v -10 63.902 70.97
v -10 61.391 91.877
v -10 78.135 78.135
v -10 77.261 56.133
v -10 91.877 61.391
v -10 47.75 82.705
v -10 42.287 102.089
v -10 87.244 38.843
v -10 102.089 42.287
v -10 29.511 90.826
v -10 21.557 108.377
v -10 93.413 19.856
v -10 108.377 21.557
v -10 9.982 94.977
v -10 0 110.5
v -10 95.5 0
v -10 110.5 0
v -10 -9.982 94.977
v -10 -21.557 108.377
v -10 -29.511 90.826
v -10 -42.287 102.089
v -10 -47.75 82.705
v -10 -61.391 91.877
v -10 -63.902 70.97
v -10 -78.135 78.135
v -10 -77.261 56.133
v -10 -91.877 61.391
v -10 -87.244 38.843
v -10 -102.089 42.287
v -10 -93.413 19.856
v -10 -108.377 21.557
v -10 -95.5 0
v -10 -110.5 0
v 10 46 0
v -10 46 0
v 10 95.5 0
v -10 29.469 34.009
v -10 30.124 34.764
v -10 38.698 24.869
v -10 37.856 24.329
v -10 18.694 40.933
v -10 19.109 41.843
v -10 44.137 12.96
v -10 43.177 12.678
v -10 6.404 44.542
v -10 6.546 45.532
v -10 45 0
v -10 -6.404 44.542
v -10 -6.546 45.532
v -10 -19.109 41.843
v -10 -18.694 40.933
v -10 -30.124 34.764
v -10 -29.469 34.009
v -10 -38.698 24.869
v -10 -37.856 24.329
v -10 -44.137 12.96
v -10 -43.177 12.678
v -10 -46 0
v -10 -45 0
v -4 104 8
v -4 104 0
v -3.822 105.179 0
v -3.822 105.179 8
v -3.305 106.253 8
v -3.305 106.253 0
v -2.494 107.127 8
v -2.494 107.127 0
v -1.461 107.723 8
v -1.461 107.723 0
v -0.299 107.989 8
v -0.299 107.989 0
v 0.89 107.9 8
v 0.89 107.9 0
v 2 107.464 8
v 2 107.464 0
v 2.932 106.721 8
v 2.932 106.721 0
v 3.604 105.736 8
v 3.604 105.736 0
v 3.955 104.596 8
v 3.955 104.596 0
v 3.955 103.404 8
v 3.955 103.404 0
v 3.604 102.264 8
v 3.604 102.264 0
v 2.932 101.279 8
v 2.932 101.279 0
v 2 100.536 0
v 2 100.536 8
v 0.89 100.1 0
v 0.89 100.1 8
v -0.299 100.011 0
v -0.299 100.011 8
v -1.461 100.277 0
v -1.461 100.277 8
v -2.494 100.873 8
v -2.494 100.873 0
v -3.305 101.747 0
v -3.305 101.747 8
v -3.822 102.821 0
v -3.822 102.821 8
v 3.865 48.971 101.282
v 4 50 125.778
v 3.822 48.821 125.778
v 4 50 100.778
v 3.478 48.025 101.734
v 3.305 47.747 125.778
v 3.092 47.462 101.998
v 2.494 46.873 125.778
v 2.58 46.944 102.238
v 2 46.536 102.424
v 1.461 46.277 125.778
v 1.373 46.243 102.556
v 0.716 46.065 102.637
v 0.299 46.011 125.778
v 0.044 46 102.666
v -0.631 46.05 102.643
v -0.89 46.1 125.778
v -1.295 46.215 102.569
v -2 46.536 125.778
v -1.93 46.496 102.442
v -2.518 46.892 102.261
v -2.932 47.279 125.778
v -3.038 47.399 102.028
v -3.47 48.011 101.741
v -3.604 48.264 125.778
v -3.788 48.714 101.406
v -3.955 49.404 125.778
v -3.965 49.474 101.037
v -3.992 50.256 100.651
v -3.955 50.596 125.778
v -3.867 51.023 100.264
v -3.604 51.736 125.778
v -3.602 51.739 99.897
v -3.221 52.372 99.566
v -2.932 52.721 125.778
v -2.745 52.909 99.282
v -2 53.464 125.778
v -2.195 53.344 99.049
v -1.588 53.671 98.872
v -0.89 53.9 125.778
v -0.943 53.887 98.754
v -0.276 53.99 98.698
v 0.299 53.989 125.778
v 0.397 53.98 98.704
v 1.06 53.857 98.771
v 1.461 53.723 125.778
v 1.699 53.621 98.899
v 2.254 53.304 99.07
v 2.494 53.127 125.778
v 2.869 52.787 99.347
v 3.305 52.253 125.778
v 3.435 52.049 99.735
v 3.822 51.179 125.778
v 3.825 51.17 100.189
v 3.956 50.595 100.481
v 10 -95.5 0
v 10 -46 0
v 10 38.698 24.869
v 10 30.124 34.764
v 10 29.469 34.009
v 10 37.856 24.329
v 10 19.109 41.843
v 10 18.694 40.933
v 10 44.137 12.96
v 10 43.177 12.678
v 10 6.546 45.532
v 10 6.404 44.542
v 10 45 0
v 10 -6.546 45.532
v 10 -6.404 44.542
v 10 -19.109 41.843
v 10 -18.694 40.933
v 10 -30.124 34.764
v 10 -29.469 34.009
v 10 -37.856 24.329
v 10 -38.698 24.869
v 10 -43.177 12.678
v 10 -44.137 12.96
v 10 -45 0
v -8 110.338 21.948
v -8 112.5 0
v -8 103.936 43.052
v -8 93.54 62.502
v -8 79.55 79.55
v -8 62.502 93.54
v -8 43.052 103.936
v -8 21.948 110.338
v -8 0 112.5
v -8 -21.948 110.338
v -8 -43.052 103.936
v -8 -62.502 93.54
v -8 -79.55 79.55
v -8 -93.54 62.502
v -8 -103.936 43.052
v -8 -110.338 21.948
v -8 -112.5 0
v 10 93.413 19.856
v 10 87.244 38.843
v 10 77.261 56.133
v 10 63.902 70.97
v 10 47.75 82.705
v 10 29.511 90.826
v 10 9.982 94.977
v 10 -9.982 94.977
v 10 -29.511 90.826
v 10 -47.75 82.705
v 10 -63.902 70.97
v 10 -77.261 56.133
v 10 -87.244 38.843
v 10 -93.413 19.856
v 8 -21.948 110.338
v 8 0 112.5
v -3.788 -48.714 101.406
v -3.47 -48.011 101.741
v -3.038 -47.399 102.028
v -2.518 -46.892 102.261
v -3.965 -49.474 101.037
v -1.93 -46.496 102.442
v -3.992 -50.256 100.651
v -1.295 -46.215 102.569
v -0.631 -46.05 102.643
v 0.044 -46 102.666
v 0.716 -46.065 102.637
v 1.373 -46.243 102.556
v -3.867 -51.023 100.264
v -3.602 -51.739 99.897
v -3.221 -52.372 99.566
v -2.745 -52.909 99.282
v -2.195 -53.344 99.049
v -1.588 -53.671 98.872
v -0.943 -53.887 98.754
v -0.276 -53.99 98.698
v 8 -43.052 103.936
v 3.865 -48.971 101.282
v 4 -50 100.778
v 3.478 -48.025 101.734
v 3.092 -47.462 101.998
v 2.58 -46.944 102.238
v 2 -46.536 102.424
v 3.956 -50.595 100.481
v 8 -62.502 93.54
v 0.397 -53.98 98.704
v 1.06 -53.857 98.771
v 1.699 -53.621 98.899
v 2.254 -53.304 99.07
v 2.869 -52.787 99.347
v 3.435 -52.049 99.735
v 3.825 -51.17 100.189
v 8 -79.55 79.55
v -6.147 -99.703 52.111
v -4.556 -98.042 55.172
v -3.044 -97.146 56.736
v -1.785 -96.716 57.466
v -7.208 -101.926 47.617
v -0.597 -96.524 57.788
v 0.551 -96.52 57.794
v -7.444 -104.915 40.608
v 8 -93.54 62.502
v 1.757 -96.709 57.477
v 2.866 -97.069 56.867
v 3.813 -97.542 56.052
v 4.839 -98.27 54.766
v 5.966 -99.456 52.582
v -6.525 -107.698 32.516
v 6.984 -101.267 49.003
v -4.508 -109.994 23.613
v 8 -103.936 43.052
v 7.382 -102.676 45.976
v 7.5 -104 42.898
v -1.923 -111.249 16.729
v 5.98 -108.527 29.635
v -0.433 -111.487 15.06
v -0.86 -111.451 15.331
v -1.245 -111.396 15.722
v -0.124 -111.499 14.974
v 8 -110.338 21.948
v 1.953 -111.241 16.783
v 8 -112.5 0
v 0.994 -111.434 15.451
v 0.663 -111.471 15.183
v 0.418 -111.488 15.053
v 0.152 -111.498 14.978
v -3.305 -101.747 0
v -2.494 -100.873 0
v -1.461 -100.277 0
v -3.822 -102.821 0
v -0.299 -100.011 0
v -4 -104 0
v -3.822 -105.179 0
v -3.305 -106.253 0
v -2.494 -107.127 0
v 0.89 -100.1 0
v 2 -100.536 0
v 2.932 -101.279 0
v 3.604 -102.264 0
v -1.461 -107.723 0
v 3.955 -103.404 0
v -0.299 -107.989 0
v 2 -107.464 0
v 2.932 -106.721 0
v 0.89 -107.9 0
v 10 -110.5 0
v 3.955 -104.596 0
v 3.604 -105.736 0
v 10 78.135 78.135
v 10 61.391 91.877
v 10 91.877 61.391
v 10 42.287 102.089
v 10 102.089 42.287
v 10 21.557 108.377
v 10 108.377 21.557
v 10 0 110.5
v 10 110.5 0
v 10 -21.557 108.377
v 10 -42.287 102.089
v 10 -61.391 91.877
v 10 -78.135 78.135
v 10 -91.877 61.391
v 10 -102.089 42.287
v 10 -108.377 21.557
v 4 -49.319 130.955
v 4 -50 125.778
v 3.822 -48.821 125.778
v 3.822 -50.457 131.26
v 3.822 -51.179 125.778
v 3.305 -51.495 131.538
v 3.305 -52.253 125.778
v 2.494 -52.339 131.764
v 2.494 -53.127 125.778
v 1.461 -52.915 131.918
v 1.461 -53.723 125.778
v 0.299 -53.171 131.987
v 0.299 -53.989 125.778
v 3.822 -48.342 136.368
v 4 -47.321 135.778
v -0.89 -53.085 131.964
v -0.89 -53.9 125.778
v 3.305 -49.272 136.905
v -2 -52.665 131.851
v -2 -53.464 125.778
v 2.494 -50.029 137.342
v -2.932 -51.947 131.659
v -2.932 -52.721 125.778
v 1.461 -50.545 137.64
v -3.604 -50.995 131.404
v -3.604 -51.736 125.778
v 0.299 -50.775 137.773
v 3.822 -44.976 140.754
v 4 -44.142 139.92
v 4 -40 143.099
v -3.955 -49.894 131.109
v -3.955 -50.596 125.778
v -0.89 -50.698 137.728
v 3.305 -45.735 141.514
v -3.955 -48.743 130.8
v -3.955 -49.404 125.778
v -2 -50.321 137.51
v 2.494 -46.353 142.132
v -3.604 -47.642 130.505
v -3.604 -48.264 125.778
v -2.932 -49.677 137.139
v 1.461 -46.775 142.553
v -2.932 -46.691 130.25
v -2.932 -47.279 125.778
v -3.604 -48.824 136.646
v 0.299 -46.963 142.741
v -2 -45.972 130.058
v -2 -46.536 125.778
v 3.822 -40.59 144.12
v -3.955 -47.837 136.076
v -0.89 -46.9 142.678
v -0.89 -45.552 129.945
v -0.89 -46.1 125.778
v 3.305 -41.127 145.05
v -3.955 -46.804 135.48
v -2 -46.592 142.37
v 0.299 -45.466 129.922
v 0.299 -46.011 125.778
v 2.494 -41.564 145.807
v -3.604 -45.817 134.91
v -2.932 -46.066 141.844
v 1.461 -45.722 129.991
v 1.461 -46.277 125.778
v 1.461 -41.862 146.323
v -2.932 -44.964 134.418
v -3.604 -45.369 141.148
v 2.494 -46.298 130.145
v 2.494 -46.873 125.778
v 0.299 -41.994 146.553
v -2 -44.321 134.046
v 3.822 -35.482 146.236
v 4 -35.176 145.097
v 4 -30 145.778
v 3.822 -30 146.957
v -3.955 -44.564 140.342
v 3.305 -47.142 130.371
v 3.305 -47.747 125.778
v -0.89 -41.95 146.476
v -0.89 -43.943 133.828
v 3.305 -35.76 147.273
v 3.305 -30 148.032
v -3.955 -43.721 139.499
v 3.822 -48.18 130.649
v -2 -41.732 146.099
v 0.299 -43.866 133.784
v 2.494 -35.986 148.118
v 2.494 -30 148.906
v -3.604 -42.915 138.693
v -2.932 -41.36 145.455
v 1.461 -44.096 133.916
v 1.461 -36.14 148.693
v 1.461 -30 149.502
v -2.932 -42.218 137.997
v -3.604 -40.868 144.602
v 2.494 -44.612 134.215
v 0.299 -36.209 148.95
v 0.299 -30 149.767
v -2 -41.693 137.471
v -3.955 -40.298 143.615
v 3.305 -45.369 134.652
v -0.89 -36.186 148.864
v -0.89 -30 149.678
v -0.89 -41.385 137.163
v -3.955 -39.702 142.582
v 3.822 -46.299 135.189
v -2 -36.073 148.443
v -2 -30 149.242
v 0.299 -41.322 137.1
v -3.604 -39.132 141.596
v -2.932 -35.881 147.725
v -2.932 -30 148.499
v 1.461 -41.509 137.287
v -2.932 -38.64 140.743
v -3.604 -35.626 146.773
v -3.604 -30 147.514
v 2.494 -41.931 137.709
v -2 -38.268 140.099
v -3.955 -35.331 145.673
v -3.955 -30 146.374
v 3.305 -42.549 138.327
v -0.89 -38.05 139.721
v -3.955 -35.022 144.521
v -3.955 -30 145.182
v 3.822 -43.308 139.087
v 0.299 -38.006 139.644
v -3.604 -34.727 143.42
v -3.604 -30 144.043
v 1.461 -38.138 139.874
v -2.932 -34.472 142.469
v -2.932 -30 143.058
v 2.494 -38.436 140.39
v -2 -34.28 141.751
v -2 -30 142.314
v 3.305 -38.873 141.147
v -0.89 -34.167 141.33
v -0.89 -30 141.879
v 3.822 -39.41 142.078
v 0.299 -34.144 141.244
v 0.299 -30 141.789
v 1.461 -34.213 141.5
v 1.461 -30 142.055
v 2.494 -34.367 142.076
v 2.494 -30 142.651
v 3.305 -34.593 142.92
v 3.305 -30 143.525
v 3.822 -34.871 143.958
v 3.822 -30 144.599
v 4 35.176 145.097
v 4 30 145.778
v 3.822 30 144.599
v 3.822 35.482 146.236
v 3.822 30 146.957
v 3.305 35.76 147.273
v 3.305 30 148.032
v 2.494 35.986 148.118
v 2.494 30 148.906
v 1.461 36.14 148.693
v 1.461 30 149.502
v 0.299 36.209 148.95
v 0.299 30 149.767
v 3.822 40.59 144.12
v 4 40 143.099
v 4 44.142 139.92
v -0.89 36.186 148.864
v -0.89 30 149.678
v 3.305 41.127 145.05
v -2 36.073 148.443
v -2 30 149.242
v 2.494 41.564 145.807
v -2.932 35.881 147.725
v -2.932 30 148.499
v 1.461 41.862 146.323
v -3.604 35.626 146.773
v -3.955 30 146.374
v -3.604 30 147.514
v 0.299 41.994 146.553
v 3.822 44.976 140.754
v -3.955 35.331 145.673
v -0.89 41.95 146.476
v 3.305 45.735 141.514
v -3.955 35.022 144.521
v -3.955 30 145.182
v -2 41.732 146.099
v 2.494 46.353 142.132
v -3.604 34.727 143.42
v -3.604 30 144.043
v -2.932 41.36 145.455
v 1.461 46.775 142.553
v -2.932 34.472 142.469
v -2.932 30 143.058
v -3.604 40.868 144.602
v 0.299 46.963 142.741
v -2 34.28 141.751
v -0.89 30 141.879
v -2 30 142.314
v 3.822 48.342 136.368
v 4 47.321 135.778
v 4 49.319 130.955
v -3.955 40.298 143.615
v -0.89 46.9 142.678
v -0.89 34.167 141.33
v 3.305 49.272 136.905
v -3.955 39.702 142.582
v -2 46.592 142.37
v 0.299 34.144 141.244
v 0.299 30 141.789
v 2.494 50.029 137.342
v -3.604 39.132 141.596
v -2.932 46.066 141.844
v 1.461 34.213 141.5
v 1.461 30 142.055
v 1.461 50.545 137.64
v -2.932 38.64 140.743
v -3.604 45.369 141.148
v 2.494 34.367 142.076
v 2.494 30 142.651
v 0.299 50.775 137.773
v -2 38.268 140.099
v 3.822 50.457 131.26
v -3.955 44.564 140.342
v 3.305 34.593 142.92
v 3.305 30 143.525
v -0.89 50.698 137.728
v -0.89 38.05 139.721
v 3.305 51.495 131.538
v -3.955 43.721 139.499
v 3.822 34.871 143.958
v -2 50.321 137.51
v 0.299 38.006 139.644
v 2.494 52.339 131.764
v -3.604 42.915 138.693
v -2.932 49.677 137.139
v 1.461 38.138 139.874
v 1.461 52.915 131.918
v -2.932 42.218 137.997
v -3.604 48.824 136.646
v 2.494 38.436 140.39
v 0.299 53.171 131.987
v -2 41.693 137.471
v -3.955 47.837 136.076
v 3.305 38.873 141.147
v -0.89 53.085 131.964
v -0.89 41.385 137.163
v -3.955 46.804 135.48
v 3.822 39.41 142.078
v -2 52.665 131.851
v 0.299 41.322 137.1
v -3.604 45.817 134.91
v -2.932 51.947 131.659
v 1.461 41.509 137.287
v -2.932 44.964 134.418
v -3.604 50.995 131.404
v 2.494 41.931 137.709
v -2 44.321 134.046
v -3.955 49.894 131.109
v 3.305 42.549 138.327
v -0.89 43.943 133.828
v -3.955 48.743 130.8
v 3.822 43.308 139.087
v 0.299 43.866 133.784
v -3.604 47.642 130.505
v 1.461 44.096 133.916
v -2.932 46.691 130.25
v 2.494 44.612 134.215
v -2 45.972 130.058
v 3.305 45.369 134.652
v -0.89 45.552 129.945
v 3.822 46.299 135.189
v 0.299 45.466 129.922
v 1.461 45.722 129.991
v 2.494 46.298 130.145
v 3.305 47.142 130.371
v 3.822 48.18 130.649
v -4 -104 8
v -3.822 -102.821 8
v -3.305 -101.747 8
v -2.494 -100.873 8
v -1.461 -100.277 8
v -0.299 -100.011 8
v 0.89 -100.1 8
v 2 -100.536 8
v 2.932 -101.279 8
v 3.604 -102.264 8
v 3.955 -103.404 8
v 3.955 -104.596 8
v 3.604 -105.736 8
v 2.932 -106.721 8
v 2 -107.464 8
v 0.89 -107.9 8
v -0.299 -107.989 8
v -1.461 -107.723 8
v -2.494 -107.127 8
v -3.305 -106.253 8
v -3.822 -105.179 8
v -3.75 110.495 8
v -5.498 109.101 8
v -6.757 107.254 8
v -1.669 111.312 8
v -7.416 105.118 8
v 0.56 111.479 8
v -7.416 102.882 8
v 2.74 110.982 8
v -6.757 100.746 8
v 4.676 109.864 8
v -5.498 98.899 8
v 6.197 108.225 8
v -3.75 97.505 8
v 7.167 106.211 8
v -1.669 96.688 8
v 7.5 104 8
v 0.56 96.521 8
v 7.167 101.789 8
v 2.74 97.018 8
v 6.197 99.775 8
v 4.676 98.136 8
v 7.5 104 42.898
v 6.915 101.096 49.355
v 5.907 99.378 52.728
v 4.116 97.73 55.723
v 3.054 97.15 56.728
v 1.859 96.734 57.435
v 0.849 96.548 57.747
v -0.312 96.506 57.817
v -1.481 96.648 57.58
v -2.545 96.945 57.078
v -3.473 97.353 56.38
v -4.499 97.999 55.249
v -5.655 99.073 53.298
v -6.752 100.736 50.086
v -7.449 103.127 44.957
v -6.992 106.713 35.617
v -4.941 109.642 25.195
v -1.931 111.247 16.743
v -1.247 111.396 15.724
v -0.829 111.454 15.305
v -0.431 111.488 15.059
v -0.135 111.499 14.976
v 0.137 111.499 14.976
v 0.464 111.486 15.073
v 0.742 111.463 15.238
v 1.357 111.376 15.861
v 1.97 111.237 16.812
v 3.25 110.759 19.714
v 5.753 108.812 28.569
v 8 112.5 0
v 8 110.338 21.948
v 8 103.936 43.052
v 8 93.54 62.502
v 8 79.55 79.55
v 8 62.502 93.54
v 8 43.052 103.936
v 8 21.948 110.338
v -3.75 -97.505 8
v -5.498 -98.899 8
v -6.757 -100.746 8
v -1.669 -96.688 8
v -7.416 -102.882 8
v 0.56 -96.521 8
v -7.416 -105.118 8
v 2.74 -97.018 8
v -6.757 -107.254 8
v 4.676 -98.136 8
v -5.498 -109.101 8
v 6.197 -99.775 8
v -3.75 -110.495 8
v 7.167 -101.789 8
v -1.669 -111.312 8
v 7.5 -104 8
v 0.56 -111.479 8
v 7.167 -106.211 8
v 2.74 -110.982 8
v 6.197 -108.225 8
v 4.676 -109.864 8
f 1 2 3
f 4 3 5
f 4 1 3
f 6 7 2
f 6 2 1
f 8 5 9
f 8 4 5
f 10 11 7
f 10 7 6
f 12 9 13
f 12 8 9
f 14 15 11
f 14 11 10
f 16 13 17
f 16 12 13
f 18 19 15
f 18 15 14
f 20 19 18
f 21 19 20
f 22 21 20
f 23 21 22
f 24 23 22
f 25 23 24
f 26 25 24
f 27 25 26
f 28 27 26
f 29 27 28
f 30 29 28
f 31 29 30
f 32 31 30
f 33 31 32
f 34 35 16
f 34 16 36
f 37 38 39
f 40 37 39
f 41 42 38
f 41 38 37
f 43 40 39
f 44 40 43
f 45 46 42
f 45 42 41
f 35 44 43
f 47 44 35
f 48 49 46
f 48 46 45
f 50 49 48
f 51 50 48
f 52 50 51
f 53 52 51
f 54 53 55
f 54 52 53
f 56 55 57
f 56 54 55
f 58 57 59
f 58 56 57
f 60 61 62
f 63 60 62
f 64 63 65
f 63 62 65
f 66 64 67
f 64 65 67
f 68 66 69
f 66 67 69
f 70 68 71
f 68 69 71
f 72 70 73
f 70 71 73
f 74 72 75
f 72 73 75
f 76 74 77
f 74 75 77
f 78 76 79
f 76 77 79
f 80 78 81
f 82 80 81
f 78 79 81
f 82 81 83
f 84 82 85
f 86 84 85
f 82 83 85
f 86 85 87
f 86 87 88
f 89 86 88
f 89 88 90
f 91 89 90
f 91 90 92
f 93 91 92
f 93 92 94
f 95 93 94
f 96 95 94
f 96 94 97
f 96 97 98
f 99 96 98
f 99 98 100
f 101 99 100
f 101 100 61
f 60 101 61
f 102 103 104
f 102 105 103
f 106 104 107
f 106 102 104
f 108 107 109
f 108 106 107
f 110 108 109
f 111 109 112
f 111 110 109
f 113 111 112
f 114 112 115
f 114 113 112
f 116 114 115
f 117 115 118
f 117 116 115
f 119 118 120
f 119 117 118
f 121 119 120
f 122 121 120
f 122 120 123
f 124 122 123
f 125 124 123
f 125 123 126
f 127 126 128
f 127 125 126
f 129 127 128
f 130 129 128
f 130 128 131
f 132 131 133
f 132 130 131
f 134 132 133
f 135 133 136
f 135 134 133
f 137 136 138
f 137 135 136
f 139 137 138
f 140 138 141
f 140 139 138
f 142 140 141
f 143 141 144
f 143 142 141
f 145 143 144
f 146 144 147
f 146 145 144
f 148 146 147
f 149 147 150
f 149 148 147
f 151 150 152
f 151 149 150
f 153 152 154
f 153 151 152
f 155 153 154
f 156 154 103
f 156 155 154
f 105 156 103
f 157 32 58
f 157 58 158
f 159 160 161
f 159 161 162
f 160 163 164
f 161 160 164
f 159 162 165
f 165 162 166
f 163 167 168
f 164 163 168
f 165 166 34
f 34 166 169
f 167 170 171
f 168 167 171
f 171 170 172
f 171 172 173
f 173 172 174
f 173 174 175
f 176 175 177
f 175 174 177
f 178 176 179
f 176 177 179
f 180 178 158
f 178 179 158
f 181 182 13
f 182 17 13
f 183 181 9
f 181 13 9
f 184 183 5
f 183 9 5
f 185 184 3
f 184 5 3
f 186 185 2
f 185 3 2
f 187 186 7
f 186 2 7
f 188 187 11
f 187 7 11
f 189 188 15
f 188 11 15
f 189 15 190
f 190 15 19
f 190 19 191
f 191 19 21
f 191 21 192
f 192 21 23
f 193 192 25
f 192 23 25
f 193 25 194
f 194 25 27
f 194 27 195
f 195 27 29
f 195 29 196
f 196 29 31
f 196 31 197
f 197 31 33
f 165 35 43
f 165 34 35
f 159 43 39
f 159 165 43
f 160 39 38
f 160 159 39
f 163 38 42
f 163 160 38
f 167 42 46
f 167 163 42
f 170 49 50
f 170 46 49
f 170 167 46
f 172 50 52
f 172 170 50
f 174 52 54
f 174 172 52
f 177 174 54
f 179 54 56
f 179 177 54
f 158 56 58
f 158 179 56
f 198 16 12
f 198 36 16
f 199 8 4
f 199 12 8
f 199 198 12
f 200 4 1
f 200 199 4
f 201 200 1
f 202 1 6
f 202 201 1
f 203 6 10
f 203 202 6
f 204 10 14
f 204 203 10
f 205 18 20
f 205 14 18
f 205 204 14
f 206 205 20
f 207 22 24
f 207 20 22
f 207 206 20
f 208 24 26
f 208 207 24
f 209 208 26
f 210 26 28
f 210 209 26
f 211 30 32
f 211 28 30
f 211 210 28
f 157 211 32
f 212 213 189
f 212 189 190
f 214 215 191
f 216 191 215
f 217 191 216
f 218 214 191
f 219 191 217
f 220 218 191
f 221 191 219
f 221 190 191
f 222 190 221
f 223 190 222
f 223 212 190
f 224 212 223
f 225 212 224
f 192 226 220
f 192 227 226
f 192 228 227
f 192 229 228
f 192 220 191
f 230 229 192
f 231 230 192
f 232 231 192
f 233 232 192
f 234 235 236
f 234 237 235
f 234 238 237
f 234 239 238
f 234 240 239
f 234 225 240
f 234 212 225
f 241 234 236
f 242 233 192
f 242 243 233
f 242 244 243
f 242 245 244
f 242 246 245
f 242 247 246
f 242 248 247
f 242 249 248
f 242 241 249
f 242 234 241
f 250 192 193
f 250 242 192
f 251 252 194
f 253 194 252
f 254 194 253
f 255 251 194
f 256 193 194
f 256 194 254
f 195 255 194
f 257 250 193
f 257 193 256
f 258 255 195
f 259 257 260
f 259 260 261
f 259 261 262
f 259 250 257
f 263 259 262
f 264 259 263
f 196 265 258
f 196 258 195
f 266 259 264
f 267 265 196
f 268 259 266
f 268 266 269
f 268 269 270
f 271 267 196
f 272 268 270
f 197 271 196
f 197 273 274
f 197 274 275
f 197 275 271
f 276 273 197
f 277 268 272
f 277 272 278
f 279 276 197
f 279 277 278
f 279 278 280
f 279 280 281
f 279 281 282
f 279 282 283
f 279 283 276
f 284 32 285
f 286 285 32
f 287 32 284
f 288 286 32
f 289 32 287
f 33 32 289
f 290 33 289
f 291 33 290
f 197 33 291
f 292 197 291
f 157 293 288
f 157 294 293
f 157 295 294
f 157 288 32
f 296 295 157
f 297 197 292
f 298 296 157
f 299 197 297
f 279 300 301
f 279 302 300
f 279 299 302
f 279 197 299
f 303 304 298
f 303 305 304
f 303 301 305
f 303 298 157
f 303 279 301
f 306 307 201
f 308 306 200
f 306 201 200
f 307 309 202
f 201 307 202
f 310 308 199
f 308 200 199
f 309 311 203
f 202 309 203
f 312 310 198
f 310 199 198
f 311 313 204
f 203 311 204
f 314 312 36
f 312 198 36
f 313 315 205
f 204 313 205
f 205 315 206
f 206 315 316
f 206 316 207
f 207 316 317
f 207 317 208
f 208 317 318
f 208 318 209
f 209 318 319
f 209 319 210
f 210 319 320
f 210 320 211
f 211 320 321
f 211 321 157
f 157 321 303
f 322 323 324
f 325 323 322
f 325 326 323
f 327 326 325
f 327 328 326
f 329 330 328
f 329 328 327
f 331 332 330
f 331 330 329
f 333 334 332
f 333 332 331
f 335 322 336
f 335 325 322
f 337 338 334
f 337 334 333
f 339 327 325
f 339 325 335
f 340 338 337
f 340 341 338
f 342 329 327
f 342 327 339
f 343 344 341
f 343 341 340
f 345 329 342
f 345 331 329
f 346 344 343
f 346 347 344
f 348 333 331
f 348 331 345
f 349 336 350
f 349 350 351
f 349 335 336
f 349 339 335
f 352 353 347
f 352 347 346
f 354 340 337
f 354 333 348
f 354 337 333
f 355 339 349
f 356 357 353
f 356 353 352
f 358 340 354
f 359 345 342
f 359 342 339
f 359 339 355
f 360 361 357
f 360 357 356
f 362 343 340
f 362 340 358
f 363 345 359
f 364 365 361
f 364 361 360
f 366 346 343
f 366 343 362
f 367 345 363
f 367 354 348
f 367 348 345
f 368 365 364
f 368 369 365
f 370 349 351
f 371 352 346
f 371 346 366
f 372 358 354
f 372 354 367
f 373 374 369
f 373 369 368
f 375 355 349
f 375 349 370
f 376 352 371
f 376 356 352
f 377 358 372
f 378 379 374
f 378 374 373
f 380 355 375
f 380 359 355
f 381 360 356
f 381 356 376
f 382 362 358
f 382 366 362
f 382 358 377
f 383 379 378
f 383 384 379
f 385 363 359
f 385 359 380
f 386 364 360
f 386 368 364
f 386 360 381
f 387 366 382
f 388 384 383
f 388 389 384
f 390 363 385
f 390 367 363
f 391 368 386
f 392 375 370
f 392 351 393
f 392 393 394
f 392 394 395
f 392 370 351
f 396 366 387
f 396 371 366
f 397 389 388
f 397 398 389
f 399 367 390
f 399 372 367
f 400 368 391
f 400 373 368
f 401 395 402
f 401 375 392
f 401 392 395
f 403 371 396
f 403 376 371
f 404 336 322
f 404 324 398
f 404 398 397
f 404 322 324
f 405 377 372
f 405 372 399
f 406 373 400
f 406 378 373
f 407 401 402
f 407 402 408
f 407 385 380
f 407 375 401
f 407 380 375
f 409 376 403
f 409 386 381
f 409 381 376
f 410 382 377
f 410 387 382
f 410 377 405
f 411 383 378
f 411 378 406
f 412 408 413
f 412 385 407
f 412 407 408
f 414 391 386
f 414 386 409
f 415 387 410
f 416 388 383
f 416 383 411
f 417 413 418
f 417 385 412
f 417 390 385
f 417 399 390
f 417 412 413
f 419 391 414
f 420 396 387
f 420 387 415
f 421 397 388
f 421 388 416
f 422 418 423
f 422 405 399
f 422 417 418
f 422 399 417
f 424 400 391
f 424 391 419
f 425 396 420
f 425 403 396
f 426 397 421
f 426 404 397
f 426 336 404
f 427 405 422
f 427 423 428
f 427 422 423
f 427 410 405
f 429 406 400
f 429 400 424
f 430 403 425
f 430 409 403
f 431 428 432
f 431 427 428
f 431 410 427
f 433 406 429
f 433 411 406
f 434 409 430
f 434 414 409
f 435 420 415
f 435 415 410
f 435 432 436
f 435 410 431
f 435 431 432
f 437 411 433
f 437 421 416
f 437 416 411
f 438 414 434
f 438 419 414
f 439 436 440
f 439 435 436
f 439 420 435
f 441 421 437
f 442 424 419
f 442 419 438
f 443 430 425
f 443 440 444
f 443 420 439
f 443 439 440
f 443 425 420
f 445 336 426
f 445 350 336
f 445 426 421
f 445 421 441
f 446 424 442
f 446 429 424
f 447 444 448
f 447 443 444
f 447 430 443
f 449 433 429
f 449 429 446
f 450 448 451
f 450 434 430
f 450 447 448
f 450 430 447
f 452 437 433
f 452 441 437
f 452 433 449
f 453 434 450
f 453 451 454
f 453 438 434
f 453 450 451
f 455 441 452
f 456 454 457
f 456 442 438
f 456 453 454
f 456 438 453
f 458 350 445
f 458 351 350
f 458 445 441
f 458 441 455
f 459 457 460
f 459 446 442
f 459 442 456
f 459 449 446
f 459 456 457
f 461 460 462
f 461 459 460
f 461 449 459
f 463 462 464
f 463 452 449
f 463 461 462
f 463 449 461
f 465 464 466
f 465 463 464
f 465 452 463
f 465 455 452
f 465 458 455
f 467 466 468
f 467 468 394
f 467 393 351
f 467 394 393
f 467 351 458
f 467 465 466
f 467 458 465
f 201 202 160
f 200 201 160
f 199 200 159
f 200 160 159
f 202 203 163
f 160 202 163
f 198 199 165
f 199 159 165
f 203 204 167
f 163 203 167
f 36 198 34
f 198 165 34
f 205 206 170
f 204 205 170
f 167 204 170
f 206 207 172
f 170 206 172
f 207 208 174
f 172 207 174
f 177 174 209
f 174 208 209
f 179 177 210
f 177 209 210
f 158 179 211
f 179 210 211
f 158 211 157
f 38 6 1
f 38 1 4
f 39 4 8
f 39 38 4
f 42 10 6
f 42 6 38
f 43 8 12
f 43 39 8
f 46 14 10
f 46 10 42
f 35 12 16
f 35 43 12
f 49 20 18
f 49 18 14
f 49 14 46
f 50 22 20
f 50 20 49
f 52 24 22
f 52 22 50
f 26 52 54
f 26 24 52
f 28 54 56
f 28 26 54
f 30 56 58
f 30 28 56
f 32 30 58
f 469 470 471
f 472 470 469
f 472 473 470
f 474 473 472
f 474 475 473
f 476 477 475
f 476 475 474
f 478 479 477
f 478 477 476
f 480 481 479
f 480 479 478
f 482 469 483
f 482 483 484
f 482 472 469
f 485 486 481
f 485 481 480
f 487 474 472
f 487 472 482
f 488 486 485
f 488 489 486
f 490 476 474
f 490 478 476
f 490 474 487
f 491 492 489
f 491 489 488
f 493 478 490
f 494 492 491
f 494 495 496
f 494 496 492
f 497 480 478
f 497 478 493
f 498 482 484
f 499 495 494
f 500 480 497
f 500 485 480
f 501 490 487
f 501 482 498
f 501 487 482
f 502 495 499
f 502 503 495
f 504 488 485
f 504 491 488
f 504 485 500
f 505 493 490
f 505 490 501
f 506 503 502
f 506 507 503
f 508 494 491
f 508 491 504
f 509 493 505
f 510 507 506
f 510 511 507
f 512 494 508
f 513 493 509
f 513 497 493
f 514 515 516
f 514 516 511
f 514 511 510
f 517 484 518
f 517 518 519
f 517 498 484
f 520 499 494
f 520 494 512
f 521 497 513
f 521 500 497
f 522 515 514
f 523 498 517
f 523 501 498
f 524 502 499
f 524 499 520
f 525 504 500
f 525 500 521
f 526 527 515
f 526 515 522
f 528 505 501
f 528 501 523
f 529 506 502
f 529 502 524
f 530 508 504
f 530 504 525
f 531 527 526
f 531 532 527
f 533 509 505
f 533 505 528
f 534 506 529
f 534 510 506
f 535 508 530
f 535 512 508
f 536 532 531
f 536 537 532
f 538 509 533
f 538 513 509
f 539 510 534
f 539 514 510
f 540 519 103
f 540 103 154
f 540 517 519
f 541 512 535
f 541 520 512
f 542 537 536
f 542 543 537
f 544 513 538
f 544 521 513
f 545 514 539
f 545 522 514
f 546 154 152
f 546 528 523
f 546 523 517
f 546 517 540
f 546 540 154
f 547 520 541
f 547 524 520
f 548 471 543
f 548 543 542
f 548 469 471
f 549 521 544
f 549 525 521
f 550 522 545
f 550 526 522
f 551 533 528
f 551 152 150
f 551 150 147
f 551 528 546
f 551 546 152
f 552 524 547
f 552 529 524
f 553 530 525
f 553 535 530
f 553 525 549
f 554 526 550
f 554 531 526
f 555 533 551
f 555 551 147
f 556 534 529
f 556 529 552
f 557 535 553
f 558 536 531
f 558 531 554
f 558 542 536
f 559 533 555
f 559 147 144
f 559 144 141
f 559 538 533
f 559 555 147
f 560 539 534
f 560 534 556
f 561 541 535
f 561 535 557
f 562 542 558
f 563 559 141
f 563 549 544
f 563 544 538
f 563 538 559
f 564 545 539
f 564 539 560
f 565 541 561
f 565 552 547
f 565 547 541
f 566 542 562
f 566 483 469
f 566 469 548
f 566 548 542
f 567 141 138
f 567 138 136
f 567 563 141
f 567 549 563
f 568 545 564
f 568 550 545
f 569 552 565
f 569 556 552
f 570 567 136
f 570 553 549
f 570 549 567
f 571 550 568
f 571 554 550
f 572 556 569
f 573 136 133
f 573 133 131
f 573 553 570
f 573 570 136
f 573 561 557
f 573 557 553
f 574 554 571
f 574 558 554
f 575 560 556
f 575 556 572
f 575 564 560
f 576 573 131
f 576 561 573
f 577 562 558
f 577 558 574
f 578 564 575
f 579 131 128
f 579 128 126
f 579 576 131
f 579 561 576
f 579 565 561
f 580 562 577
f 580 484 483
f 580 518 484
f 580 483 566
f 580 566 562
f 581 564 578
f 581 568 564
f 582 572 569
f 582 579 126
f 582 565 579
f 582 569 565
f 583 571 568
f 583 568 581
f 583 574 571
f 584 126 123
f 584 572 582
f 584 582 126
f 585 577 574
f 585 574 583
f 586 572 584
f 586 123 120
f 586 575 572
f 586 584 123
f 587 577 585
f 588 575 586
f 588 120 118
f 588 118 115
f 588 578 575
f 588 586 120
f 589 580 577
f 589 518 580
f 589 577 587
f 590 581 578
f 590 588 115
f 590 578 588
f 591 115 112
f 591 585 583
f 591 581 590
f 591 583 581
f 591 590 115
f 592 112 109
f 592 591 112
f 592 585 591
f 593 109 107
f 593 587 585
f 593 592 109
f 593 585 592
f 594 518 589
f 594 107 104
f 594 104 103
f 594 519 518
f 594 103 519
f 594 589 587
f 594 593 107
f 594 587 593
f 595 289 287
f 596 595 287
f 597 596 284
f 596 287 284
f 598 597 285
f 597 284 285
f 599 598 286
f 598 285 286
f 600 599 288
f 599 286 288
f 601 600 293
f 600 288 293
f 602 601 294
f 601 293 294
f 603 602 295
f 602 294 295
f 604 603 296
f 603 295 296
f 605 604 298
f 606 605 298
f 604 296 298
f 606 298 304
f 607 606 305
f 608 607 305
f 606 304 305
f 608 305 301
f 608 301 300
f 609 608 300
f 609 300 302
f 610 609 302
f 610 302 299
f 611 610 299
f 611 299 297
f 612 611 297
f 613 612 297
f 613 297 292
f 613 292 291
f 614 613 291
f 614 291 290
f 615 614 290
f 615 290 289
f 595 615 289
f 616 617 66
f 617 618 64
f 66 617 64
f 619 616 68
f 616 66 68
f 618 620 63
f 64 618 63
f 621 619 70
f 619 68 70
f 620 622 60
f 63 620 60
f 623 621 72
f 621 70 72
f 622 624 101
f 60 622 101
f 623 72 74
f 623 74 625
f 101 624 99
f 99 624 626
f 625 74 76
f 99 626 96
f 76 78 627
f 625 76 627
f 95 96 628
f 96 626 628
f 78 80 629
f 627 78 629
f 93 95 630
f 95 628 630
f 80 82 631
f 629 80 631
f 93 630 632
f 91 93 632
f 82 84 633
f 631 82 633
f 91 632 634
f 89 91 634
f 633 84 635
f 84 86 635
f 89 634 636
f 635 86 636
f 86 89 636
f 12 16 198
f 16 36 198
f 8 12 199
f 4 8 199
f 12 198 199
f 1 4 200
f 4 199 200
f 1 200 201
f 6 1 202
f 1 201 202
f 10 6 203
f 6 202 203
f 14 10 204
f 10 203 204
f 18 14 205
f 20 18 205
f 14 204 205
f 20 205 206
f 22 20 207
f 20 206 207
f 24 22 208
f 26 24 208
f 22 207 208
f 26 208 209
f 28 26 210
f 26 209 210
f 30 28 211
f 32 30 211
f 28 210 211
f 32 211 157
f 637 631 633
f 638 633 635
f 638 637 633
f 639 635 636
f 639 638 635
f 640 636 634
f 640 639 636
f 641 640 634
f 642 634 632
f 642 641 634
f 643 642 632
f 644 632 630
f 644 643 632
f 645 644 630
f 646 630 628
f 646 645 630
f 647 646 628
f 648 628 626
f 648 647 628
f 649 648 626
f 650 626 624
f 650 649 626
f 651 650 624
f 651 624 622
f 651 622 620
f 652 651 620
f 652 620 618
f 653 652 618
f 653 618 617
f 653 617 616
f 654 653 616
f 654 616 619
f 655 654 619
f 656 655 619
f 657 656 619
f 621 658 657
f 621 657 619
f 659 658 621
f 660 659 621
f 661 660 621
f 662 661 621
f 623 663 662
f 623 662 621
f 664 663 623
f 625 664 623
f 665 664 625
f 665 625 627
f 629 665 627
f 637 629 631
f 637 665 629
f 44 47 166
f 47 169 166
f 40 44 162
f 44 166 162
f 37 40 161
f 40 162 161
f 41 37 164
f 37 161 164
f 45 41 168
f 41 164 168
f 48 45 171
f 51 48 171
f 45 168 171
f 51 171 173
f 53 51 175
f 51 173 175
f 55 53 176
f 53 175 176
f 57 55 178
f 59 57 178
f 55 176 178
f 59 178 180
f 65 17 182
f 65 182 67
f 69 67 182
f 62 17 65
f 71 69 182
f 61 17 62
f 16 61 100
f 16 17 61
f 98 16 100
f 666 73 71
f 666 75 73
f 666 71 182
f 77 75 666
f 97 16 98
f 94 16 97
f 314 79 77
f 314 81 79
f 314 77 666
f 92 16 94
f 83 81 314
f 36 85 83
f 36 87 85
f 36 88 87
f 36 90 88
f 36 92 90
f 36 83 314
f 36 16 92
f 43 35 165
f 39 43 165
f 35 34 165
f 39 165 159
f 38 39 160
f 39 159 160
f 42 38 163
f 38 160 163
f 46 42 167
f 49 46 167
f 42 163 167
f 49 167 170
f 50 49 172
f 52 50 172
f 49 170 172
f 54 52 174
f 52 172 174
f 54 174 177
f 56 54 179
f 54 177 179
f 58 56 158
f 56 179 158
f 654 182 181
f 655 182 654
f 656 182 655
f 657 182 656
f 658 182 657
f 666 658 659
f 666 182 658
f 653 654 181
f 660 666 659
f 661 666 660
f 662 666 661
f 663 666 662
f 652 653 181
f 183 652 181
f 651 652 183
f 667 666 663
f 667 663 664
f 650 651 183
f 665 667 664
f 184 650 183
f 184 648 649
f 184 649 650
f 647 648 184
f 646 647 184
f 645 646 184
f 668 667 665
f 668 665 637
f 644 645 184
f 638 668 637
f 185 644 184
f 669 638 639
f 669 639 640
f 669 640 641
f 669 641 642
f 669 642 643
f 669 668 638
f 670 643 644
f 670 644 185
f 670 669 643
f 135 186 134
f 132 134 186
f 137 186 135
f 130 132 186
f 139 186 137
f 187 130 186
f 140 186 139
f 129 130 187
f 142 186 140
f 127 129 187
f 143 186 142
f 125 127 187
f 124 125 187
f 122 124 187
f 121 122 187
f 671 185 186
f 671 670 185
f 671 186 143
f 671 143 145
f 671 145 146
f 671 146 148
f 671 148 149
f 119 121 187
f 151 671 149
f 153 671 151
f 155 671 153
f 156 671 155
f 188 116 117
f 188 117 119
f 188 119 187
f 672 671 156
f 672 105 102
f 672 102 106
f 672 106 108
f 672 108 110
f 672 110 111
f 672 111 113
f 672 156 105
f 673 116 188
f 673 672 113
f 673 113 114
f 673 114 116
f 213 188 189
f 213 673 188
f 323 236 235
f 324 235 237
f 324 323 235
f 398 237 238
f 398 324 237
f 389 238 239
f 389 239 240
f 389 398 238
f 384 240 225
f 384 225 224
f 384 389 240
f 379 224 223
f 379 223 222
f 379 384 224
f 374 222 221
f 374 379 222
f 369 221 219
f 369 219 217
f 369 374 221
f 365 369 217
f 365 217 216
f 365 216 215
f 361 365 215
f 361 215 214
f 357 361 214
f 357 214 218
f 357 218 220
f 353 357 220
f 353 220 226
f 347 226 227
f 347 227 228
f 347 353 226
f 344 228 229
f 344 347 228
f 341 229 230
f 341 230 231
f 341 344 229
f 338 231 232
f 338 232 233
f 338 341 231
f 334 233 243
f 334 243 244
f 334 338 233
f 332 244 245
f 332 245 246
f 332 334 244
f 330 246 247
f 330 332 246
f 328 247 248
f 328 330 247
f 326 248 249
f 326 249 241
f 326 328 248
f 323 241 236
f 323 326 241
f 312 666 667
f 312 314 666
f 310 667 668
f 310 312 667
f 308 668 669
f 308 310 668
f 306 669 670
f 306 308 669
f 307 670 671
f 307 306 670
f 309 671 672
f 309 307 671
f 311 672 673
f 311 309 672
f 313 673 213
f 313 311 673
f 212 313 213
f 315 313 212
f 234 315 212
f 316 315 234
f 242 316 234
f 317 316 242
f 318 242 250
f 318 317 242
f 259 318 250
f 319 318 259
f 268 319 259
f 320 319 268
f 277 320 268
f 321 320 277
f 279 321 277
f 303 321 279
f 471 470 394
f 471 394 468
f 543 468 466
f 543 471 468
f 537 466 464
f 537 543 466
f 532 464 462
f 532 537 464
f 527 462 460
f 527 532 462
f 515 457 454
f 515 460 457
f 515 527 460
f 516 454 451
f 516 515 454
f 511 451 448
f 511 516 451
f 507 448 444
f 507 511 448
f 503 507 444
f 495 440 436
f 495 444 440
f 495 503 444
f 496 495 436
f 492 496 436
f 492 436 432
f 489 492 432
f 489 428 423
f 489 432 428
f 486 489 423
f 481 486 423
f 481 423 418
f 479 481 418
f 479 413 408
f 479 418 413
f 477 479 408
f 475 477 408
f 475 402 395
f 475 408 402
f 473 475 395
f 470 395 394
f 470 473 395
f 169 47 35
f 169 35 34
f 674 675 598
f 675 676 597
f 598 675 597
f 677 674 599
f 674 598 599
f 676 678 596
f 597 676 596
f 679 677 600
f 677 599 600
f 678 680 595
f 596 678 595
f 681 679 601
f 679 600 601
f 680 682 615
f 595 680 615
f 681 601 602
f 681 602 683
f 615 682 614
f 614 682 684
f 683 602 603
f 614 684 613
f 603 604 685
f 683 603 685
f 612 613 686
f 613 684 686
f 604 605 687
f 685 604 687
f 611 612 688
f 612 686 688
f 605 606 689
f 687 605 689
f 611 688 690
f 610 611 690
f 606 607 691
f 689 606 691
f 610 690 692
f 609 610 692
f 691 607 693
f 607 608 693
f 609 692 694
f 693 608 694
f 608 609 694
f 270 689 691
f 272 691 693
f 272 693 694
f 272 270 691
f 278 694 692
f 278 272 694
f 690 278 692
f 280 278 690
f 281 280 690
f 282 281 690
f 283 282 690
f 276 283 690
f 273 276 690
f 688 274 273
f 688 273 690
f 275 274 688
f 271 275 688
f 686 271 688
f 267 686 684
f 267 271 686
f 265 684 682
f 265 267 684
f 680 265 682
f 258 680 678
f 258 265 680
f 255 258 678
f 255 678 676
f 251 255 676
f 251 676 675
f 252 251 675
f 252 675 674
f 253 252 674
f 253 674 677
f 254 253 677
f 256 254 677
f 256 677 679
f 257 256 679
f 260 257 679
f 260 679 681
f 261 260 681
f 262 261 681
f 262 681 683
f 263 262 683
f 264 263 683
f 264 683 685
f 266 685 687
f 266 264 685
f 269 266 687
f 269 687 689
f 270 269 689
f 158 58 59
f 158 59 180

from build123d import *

# Parameters (mm, degrees)
F0_W           = 20
F0_H           = 1
F2_W           = 20
F2_H           = 49.5
F4_W           = 20
F4_H           = 17
F8_R           = 4
F10_SIZE       = 2
F11_W          = 20
F11_H          = 115
F12_DEPTH      = 112.5010001
F12_DEPTH_BACK = 112.5010001
F14_R          = 7.5
F15_DEPTH      = 52
F17_D          = 8


with BuildPart() as f1:
    # F0 (on Front) → F1 (revolve)
    with BuildSketch(Plane.XZ):
        with Locations((0, 45.5)):
            Rectangle(F0_W, F0_H)
    revolve(axis=Axis((0, 0, 0), (1, 0, 0)))


with BuildPart() as f3:
    # F2 (on Front) → F3 (revolve)
    with BuildSketch(Plane.XZ):
        with Locations((0, 70.75)):
            Rectangle(F2_W, F2_H)
    revolve(axis=Axis((0, 0, 0), (1, 0, 0)))


with BuildPart() as f5:
    # F4 (on Front) → F5 (revolve)
    with BuildSketch(Plane.XZ):
        with Locations((0, 104)):
            Rectangle(F4_W, F4_H)
    revolve(axis=Axis((0, 0, 0), (1, 0, 0)))

    # F9: sweep along a path in F6
    with BuildLine(Plane.YZ) as f9_path:
        Line((-50, 95.1643315534), (-50, 125.7782218537))
        ThreePointArc((-50, 125.7782218537), (-44.1421356237, 139.9203574775), (-30, 145.7782218537))
        Line((-30, 145.7782218537), (30, 145.7782218537))
        ThreePointArc((30, 145.7782218537), (44.1421356237, 139.9203574775), (50, 125.7782218537))
        Line((50, 125.7782218537), (50, 95.1643315534))
    # F8 (on plane+point) → F9 (sweep)
    with BuildSketch(Plane.XY.offset(95.1643315534)):
        with Locations((0, -50)):
            Circle(F8_R)
    sweep(path=f9_path.line)

    # F10
    f10_edges = [f5.edges().sort_by_distance(p)[0] for p in [
        (10, 0, -112.5),
        (-10, 0, -112.5),
    ]]
    chamfer(f10_edges, length=F10_SIZE)


with BuildPart() as f12_tool:
    # F11 (on Front) → F12 (new body, two sides)
    with BuildSketch(Plane.XZ) as f12_sk:
        with Locations((0, -57.5)):
            Rectangle(F11_W, F11_H)
    extrude(amount=F12_DEPTH)
    extrude(f12_sk.sketch, amount=-F12_DEPTH_BACK)


with BuildPart() as f1_1:
    add(f1.part)

    # F12: cut by f12_tool
    add(f12_tool.part, mode=Mode.SUBTRACT)


with BuildPart() as f3_1:
    add(f3.part)

    # F12: cut by f12_tool
    add(f12_tool.part, mode=Mode.SUBTRACT)


with BuildPart() as f5_1:
    add(f5.part)

    # F12: cut by f12_tool
    add(f12_tool.part, mode=Mode.SUBTRACT)

    # F14 (on offset) → F15 (cut)
    with BuildSketch(Plane(origin=(0, 0, 60), x_dir=(1, 0, 0), z_dir=(0, 0, -1))):
        with Locations((0, 104)):
            Circle(F14_R)
        with Locations((0, -104)):
            Circle(F14_R)
    extrude(amount=F15_DEPTH, mode=Mode.SUBTRACT)

    # F17 (through all)
    with Locations(Plane.XY.offset(8)):
        with Locations((0, 104), (0, -104)):
            Hole(F17_D / 2)


solid = Compound([f1_1.part, f3_1.part, f5_1.part])
